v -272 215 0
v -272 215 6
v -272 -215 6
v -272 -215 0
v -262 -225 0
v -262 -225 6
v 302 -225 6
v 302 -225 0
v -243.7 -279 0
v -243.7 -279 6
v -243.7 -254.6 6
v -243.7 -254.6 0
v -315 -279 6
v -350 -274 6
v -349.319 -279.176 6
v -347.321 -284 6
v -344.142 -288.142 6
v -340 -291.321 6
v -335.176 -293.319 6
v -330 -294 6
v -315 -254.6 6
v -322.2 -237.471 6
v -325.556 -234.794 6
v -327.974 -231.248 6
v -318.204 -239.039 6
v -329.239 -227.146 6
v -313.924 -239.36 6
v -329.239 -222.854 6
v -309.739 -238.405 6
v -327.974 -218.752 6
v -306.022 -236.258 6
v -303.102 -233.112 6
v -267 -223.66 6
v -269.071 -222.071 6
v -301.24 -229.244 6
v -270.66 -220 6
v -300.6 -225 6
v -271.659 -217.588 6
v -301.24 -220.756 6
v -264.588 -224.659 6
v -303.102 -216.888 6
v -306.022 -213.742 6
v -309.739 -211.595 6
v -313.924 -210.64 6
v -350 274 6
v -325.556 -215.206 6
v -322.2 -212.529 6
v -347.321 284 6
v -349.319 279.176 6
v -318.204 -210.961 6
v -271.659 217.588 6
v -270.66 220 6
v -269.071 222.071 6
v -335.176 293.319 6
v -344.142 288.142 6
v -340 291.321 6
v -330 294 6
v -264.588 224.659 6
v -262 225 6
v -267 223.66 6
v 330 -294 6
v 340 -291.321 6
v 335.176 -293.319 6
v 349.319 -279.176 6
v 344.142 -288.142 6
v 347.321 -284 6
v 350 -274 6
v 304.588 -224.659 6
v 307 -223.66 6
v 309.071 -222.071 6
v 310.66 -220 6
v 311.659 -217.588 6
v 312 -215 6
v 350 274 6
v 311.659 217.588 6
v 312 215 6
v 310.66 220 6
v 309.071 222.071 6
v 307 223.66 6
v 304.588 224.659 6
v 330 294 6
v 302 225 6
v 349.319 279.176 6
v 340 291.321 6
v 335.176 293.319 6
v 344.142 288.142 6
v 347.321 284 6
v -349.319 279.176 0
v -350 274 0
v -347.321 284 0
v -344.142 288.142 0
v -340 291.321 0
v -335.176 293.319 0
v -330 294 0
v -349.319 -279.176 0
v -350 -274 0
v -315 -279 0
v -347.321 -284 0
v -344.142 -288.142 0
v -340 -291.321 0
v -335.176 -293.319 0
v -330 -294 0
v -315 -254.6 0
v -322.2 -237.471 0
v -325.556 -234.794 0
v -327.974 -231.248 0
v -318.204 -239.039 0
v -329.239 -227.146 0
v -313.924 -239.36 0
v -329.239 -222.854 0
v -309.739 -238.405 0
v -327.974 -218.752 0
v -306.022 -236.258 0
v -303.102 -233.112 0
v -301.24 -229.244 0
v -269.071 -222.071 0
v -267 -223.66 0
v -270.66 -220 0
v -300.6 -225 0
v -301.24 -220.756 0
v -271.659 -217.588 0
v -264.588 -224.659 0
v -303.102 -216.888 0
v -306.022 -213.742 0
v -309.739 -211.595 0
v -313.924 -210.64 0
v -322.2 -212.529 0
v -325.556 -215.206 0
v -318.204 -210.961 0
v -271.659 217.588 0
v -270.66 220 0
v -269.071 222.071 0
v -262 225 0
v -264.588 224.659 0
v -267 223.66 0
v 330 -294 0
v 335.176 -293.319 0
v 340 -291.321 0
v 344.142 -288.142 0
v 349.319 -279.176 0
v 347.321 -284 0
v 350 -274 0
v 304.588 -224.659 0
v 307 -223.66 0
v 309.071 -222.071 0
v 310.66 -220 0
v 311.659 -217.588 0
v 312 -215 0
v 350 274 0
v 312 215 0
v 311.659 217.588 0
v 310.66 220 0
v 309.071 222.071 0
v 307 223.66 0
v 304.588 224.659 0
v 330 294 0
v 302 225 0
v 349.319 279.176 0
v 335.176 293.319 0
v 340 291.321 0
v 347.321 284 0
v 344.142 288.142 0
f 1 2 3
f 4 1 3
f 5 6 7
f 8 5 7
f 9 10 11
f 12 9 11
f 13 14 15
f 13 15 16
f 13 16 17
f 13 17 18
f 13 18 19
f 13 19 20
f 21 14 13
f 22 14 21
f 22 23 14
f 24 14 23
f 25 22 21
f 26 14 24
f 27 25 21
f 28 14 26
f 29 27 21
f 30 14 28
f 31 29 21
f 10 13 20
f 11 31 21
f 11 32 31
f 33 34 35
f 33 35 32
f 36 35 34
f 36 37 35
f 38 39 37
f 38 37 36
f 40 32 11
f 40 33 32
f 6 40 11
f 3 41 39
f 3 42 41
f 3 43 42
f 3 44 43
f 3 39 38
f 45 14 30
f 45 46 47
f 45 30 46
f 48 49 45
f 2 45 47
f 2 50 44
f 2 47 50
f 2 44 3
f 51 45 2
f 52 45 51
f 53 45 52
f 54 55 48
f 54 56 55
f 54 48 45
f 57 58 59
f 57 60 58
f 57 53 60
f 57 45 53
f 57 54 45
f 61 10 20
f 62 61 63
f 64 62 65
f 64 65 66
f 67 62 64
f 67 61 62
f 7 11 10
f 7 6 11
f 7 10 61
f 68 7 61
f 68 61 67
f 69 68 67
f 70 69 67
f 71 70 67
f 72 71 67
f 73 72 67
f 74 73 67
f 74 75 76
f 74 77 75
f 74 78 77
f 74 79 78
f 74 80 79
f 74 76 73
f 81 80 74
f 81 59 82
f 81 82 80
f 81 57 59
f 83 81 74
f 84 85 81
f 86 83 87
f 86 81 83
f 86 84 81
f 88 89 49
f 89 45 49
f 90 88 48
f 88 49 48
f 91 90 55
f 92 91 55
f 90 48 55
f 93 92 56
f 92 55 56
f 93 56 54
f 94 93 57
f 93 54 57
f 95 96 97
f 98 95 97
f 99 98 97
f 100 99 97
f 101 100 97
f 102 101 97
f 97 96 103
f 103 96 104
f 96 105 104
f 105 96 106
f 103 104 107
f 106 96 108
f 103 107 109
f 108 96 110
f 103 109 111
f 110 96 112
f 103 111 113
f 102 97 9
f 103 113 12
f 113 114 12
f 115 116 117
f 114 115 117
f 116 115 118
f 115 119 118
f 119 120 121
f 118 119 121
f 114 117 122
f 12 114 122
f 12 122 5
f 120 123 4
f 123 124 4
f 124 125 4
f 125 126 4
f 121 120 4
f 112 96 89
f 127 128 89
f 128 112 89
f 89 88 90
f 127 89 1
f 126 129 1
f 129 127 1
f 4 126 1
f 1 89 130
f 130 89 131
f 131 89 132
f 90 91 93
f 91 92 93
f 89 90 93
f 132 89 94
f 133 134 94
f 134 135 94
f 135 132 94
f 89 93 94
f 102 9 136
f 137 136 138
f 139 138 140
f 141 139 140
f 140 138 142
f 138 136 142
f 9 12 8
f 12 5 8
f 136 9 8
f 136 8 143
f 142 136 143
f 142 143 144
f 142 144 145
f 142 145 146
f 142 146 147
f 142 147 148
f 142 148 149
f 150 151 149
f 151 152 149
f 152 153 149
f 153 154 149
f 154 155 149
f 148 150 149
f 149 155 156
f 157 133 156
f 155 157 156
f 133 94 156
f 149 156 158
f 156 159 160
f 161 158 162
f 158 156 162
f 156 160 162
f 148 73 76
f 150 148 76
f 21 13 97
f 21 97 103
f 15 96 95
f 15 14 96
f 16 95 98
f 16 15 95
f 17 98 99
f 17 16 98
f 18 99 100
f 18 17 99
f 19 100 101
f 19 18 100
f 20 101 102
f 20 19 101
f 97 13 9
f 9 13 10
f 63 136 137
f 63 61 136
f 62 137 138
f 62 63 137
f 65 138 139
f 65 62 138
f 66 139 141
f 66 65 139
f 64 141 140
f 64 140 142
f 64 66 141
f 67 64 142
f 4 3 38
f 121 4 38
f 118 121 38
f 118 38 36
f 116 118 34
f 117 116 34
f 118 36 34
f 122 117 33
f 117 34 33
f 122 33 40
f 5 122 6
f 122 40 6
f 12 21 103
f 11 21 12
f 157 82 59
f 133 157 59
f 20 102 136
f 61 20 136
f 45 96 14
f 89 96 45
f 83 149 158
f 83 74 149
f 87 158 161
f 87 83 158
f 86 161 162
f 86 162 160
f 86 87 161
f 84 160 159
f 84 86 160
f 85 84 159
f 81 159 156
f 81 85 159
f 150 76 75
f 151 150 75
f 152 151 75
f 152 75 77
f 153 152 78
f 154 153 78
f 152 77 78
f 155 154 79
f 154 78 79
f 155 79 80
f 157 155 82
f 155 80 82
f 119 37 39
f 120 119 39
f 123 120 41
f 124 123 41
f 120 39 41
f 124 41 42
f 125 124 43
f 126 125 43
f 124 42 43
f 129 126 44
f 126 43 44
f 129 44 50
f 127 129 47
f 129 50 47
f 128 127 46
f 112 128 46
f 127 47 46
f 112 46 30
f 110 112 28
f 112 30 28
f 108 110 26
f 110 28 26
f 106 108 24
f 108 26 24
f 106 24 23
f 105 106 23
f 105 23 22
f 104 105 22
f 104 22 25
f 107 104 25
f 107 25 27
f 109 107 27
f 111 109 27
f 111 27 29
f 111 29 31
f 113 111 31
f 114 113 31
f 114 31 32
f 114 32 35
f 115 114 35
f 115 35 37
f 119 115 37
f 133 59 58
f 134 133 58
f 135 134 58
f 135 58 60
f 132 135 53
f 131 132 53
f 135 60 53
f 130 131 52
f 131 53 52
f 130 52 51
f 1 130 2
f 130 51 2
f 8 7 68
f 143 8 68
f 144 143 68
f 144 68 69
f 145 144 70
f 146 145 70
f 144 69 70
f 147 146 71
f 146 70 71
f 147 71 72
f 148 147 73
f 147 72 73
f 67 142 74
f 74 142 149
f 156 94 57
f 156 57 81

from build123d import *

# Parameters (mm, degrees)
SKETCH1_W           = 700
SKETCH1_H           = 588
BOSS_EXTRUDE1_DEPTH = 6
FILLET1_R           = 20
SKETCH2_R           = 14.4
SKETCH2_W           = 71.3
SKETCH2_H           = 24.4
CUT_EXTRUDE1_DEPTH  = 10


with BuildPart() as part:
    # Sketch1 → Boss-Extrude1 (new body)
    with BuildSketch(Plane.XY):
        Rectangle(SKETCH1_W, SKETCH1_H)
    extrude(amount=BOSS_EXTRUDE1_DEPTH)

    # Fillet1
    fillet1_edges = [part.edges().sort_by_distance(p)[0] for p in [
        (350, -294, 3),
        (-350, -294, 3),
        (-350, 294, 3),
        (350, 294, 3),
    ]]
    fillet(fillet1_edges, radius=FILLET1_R)

    # Sketch2 → Cut-Extrude1 (cut)
    with BuildSketch(Plane.XY.offset(6)):
        with Locations((-315, -225)):
            Circle(SKETCH2_R)
        with Locations((-279.35, -266.8)):
            Rectangle(SKETCH2_W, SKETCH2_H)
        with BuildLine():
            Line((-262, -225), (302, -225))
            ThreePointArc((302, -225), (309.071067812, -222.071067812), (312, -215))
            Line((312, -215), (312, 215))
            ThreePointArc((312, 215), (309.071067812, 222.071067812), (302, 225))
            Line((302, 225), (-262, 225))
            ThreePointArc((-262, 225), (-269.071067812, 222.071067812), (-272, 215))
            Line((-272, 215), (-272, -215))
            ThreePointArc((-272, -215), (-269.071067812, -222.071067812), (-262, -225))
        make_face()
    extrude(amount=-CUT_EXTRUDE1_DEPTH, mode=Mode.SUBTRACT)


solid = part.part
